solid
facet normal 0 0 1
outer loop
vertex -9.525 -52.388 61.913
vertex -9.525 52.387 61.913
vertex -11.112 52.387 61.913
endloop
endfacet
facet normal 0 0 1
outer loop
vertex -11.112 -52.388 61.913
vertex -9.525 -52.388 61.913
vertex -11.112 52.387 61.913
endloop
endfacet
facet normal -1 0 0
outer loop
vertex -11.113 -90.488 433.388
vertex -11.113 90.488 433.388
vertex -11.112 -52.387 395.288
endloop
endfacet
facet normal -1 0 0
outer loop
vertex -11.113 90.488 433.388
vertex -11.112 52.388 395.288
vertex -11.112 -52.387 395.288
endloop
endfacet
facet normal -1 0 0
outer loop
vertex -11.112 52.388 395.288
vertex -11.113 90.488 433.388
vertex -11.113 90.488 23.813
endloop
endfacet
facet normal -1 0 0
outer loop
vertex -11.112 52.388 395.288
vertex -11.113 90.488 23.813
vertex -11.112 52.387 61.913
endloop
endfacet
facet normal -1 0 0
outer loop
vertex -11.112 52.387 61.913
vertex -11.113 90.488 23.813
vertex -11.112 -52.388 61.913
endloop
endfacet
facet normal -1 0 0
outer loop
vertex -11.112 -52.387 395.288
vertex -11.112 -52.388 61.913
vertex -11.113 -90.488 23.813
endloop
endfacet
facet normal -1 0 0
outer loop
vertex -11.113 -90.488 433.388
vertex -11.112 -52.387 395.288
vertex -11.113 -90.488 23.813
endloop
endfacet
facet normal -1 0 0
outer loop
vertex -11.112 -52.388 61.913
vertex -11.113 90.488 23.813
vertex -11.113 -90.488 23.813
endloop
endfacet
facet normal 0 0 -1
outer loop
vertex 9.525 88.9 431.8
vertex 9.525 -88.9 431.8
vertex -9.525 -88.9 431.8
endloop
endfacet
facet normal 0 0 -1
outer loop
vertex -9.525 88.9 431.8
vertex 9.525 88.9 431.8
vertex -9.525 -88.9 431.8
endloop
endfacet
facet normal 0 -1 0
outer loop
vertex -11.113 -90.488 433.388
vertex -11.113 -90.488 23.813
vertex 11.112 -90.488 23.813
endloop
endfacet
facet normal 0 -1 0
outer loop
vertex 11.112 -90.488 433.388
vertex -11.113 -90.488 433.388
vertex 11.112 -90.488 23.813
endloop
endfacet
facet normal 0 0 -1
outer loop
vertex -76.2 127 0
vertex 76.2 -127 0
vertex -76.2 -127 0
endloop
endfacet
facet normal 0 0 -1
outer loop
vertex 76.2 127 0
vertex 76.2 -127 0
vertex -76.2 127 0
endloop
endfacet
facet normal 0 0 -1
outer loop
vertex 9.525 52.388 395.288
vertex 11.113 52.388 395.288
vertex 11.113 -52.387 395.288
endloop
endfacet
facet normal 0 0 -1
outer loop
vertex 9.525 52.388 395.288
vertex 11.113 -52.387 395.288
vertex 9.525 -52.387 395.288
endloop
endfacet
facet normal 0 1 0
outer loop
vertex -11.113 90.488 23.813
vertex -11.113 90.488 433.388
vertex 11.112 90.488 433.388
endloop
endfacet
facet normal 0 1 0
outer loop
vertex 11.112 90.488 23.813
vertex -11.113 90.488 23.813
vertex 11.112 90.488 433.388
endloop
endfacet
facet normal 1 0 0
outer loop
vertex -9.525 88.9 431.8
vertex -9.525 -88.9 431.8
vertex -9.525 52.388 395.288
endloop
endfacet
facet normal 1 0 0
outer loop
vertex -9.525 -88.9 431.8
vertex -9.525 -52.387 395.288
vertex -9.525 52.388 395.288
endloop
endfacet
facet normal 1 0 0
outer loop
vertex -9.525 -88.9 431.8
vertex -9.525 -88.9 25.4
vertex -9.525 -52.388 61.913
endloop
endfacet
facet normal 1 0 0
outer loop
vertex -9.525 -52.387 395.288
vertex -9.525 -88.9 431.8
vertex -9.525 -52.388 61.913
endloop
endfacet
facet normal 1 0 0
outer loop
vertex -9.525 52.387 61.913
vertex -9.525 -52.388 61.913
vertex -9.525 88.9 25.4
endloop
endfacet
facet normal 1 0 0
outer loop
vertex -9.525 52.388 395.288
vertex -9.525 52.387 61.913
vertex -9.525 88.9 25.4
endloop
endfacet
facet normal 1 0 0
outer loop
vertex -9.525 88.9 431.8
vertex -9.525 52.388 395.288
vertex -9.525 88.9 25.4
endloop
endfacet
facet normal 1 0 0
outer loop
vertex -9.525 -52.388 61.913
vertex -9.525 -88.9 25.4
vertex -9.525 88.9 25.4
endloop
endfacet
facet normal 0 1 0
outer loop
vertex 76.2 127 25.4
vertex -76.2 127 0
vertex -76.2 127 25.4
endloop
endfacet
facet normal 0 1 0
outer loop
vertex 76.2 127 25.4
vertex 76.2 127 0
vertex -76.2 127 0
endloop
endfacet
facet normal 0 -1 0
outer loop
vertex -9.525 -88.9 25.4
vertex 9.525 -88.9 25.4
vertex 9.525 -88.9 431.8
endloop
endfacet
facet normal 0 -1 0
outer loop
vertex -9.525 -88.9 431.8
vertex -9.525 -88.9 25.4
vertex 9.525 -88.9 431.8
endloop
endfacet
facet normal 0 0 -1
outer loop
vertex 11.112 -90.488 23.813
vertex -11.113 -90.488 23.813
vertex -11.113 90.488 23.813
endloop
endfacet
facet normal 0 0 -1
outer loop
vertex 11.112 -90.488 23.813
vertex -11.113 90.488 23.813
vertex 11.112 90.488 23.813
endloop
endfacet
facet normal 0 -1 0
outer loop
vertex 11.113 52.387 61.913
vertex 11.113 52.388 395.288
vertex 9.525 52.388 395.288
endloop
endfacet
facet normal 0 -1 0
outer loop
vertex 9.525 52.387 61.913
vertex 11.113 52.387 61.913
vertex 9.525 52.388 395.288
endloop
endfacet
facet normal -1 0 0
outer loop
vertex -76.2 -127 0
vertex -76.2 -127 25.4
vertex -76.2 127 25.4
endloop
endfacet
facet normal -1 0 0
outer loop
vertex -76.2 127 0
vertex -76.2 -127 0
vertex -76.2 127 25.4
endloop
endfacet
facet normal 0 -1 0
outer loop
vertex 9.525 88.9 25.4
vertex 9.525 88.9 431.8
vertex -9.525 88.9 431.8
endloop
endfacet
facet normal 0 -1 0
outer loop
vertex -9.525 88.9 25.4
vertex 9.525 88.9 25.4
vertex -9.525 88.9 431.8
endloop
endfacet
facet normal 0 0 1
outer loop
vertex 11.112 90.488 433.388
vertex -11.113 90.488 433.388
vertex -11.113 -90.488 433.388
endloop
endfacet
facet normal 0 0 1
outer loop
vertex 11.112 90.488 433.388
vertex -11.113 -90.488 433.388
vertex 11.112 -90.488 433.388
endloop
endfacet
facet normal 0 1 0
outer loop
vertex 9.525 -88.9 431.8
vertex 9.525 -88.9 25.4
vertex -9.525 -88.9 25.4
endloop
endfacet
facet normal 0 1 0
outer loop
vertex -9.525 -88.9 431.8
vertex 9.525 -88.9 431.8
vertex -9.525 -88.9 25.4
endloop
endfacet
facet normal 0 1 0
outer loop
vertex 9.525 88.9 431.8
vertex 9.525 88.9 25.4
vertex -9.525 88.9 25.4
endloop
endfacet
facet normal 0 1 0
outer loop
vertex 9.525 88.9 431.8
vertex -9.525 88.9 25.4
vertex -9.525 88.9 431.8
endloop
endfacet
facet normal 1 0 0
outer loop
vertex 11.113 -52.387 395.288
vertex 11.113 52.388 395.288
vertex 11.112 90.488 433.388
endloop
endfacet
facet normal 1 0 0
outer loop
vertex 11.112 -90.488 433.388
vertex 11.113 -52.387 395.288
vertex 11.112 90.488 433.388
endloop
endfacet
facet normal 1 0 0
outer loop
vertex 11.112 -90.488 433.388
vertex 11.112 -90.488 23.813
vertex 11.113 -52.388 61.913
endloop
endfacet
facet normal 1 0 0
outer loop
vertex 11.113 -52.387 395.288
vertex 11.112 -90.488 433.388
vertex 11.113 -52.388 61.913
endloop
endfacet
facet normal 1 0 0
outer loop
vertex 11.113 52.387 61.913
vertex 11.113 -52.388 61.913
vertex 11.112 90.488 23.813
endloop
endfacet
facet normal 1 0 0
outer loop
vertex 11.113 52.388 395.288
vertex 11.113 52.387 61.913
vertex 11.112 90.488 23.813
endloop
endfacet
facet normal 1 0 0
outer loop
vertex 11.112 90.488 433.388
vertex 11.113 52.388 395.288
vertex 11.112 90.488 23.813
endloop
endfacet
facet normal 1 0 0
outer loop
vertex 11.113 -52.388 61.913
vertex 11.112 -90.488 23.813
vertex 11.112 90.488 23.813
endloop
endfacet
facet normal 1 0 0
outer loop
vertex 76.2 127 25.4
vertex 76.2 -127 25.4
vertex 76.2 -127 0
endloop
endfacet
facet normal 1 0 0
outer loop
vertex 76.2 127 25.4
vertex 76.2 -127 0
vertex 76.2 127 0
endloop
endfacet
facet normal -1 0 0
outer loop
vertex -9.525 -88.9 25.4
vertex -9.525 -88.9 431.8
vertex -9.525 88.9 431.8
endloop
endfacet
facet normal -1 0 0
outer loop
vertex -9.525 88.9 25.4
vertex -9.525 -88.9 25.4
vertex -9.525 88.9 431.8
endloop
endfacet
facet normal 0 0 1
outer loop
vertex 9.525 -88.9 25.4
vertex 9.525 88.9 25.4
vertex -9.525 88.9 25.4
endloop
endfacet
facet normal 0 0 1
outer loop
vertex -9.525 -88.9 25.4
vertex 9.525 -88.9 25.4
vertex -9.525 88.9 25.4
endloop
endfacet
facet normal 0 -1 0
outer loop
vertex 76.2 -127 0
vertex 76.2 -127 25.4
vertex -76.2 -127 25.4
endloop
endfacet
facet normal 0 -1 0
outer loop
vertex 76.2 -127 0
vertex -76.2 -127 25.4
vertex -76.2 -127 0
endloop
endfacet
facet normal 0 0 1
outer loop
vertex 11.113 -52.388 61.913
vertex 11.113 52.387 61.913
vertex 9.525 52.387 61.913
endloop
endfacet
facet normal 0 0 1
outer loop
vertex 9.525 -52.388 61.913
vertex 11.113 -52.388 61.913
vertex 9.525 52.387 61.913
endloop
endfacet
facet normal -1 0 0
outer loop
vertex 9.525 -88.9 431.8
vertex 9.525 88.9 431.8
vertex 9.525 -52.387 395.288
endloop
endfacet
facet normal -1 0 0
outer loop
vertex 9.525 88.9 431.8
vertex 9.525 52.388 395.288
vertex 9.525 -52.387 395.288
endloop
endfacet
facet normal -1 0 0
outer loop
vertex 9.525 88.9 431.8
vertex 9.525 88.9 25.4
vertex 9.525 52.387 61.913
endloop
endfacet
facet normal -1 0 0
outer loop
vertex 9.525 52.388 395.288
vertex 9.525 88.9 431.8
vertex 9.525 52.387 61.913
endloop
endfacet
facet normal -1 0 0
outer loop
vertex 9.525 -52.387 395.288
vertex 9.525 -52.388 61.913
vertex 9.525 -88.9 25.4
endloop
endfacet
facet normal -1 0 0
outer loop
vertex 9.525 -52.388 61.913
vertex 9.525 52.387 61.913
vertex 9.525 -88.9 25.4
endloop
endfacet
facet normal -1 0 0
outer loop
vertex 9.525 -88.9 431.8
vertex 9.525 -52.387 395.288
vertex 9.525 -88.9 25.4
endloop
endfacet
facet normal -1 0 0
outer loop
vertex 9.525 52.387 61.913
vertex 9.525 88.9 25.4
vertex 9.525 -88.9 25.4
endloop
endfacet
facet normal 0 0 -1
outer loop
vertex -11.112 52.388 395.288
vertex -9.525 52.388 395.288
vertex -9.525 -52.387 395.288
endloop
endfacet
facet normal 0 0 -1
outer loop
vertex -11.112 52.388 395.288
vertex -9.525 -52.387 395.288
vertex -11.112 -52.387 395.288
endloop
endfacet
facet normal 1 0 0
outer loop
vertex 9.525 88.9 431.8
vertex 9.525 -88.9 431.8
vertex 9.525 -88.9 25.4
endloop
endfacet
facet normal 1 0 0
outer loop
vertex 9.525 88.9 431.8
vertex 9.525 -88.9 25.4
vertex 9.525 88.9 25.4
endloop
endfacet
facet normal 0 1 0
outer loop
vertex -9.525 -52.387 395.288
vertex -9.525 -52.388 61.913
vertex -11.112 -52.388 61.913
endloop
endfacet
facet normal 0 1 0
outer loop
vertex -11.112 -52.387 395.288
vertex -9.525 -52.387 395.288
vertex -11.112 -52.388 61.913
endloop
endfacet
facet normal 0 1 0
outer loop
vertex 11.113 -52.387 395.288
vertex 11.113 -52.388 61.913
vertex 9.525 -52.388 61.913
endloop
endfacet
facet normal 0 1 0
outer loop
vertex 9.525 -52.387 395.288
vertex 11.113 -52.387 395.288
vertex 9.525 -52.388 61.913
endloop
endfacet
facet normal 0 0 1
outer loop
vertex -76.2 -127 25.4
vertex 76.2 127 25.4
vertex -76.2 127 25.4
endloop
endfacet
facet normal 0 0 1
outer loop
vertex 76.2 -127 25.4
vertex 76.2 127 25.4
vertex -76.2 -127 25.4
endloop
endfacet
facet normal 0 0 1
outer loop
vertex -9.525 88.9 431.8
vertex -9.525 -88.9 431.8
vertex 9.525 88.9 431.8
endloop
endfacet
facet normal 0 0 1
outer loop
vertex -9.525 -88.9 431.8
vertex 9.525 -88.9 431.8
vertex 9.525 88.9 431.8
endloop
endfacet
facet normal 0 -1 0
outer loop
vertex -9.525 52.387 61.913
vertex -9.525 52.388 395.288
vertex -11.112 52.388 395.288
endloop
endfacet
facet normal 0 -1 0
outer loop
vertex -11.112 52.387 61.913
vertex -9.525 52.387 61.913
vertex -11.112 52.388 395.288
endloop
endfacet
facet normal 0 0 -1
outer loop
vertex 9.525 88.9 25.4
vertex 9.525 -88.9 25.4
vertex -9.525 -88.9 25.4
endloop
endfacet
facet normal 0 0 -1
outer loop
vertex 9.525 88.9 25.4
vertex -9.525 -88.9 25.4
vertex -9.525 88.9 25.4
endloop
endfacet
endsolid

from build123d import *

# Parameters (mm, degrees)
F0_W     = 177.8
F0_H     = 406.4
F0_W_2   = 76.2
F0_H_2   = 304.8
F1_DEPTH = 9.525
F2_DEPTH = 76.2


with BuildPart() as f1:
    # F0 (on Right) → F1 (new body, symmetric)
    with BuildSketch(Plane.YZ):
        with Locations((0, 228.6)):
            Rectangle(F0_W, F0_H)
        with Locations((0, 228.6)):
            Rectangle(F0_W_2, F0_H_2, mode=Mode.SUBTRACT)
        with Locations((0, 228.6)):
            Rectangle(F0_W_2, F0_H_2)
    extrude(amount=F1_DEPTH, both=True)


with BuildPart() as f2:
    # F0 (on Right) → F2 (new body, symmetric)
    with BuildSketch(Plane.YZ):
        Polygon((127, 25.4), (88.9, 25.4), (-88.9, 25.4), (-127, 25.4), (-127, 0), (127, 0), align=None)
    extrude(amount=F2_DEPTH, both=True)


with BuildPart() as f4:
    # F4: sweep along a path in F4_path
    with BuildLine(Plane(origin=(9.525, -88.9, 431.8), x_dir=(0, 0, -1), z_dir=(-1, 0, 0))) as f4_path:
        Line((0, 0), (406.4, 0))
        Line((406.4, 0), (406.4, -177.8))
        Line((406.4, -177.8), (0, -177.8))
        Line((0, -177.8), (0, 0))
    # F3 (on face) → F4 (sweep)
    with BuildSketch(Plane.XY.offset(25.4)):
        Polygon((9.525, -88.9), (-9.525, -88.9), (-9.525, -52.3875), (-11.1125, -52.3875), (-11.1125, -90.4875), (11.1125, -90.4875), (11.1125, -52.3875), (9.525, -52.3875), align=None)
    sweep(path=f4_path.line, transition=Transition.RIGHT)


solid = Compound([f1.part, f2.part, f4.part])
